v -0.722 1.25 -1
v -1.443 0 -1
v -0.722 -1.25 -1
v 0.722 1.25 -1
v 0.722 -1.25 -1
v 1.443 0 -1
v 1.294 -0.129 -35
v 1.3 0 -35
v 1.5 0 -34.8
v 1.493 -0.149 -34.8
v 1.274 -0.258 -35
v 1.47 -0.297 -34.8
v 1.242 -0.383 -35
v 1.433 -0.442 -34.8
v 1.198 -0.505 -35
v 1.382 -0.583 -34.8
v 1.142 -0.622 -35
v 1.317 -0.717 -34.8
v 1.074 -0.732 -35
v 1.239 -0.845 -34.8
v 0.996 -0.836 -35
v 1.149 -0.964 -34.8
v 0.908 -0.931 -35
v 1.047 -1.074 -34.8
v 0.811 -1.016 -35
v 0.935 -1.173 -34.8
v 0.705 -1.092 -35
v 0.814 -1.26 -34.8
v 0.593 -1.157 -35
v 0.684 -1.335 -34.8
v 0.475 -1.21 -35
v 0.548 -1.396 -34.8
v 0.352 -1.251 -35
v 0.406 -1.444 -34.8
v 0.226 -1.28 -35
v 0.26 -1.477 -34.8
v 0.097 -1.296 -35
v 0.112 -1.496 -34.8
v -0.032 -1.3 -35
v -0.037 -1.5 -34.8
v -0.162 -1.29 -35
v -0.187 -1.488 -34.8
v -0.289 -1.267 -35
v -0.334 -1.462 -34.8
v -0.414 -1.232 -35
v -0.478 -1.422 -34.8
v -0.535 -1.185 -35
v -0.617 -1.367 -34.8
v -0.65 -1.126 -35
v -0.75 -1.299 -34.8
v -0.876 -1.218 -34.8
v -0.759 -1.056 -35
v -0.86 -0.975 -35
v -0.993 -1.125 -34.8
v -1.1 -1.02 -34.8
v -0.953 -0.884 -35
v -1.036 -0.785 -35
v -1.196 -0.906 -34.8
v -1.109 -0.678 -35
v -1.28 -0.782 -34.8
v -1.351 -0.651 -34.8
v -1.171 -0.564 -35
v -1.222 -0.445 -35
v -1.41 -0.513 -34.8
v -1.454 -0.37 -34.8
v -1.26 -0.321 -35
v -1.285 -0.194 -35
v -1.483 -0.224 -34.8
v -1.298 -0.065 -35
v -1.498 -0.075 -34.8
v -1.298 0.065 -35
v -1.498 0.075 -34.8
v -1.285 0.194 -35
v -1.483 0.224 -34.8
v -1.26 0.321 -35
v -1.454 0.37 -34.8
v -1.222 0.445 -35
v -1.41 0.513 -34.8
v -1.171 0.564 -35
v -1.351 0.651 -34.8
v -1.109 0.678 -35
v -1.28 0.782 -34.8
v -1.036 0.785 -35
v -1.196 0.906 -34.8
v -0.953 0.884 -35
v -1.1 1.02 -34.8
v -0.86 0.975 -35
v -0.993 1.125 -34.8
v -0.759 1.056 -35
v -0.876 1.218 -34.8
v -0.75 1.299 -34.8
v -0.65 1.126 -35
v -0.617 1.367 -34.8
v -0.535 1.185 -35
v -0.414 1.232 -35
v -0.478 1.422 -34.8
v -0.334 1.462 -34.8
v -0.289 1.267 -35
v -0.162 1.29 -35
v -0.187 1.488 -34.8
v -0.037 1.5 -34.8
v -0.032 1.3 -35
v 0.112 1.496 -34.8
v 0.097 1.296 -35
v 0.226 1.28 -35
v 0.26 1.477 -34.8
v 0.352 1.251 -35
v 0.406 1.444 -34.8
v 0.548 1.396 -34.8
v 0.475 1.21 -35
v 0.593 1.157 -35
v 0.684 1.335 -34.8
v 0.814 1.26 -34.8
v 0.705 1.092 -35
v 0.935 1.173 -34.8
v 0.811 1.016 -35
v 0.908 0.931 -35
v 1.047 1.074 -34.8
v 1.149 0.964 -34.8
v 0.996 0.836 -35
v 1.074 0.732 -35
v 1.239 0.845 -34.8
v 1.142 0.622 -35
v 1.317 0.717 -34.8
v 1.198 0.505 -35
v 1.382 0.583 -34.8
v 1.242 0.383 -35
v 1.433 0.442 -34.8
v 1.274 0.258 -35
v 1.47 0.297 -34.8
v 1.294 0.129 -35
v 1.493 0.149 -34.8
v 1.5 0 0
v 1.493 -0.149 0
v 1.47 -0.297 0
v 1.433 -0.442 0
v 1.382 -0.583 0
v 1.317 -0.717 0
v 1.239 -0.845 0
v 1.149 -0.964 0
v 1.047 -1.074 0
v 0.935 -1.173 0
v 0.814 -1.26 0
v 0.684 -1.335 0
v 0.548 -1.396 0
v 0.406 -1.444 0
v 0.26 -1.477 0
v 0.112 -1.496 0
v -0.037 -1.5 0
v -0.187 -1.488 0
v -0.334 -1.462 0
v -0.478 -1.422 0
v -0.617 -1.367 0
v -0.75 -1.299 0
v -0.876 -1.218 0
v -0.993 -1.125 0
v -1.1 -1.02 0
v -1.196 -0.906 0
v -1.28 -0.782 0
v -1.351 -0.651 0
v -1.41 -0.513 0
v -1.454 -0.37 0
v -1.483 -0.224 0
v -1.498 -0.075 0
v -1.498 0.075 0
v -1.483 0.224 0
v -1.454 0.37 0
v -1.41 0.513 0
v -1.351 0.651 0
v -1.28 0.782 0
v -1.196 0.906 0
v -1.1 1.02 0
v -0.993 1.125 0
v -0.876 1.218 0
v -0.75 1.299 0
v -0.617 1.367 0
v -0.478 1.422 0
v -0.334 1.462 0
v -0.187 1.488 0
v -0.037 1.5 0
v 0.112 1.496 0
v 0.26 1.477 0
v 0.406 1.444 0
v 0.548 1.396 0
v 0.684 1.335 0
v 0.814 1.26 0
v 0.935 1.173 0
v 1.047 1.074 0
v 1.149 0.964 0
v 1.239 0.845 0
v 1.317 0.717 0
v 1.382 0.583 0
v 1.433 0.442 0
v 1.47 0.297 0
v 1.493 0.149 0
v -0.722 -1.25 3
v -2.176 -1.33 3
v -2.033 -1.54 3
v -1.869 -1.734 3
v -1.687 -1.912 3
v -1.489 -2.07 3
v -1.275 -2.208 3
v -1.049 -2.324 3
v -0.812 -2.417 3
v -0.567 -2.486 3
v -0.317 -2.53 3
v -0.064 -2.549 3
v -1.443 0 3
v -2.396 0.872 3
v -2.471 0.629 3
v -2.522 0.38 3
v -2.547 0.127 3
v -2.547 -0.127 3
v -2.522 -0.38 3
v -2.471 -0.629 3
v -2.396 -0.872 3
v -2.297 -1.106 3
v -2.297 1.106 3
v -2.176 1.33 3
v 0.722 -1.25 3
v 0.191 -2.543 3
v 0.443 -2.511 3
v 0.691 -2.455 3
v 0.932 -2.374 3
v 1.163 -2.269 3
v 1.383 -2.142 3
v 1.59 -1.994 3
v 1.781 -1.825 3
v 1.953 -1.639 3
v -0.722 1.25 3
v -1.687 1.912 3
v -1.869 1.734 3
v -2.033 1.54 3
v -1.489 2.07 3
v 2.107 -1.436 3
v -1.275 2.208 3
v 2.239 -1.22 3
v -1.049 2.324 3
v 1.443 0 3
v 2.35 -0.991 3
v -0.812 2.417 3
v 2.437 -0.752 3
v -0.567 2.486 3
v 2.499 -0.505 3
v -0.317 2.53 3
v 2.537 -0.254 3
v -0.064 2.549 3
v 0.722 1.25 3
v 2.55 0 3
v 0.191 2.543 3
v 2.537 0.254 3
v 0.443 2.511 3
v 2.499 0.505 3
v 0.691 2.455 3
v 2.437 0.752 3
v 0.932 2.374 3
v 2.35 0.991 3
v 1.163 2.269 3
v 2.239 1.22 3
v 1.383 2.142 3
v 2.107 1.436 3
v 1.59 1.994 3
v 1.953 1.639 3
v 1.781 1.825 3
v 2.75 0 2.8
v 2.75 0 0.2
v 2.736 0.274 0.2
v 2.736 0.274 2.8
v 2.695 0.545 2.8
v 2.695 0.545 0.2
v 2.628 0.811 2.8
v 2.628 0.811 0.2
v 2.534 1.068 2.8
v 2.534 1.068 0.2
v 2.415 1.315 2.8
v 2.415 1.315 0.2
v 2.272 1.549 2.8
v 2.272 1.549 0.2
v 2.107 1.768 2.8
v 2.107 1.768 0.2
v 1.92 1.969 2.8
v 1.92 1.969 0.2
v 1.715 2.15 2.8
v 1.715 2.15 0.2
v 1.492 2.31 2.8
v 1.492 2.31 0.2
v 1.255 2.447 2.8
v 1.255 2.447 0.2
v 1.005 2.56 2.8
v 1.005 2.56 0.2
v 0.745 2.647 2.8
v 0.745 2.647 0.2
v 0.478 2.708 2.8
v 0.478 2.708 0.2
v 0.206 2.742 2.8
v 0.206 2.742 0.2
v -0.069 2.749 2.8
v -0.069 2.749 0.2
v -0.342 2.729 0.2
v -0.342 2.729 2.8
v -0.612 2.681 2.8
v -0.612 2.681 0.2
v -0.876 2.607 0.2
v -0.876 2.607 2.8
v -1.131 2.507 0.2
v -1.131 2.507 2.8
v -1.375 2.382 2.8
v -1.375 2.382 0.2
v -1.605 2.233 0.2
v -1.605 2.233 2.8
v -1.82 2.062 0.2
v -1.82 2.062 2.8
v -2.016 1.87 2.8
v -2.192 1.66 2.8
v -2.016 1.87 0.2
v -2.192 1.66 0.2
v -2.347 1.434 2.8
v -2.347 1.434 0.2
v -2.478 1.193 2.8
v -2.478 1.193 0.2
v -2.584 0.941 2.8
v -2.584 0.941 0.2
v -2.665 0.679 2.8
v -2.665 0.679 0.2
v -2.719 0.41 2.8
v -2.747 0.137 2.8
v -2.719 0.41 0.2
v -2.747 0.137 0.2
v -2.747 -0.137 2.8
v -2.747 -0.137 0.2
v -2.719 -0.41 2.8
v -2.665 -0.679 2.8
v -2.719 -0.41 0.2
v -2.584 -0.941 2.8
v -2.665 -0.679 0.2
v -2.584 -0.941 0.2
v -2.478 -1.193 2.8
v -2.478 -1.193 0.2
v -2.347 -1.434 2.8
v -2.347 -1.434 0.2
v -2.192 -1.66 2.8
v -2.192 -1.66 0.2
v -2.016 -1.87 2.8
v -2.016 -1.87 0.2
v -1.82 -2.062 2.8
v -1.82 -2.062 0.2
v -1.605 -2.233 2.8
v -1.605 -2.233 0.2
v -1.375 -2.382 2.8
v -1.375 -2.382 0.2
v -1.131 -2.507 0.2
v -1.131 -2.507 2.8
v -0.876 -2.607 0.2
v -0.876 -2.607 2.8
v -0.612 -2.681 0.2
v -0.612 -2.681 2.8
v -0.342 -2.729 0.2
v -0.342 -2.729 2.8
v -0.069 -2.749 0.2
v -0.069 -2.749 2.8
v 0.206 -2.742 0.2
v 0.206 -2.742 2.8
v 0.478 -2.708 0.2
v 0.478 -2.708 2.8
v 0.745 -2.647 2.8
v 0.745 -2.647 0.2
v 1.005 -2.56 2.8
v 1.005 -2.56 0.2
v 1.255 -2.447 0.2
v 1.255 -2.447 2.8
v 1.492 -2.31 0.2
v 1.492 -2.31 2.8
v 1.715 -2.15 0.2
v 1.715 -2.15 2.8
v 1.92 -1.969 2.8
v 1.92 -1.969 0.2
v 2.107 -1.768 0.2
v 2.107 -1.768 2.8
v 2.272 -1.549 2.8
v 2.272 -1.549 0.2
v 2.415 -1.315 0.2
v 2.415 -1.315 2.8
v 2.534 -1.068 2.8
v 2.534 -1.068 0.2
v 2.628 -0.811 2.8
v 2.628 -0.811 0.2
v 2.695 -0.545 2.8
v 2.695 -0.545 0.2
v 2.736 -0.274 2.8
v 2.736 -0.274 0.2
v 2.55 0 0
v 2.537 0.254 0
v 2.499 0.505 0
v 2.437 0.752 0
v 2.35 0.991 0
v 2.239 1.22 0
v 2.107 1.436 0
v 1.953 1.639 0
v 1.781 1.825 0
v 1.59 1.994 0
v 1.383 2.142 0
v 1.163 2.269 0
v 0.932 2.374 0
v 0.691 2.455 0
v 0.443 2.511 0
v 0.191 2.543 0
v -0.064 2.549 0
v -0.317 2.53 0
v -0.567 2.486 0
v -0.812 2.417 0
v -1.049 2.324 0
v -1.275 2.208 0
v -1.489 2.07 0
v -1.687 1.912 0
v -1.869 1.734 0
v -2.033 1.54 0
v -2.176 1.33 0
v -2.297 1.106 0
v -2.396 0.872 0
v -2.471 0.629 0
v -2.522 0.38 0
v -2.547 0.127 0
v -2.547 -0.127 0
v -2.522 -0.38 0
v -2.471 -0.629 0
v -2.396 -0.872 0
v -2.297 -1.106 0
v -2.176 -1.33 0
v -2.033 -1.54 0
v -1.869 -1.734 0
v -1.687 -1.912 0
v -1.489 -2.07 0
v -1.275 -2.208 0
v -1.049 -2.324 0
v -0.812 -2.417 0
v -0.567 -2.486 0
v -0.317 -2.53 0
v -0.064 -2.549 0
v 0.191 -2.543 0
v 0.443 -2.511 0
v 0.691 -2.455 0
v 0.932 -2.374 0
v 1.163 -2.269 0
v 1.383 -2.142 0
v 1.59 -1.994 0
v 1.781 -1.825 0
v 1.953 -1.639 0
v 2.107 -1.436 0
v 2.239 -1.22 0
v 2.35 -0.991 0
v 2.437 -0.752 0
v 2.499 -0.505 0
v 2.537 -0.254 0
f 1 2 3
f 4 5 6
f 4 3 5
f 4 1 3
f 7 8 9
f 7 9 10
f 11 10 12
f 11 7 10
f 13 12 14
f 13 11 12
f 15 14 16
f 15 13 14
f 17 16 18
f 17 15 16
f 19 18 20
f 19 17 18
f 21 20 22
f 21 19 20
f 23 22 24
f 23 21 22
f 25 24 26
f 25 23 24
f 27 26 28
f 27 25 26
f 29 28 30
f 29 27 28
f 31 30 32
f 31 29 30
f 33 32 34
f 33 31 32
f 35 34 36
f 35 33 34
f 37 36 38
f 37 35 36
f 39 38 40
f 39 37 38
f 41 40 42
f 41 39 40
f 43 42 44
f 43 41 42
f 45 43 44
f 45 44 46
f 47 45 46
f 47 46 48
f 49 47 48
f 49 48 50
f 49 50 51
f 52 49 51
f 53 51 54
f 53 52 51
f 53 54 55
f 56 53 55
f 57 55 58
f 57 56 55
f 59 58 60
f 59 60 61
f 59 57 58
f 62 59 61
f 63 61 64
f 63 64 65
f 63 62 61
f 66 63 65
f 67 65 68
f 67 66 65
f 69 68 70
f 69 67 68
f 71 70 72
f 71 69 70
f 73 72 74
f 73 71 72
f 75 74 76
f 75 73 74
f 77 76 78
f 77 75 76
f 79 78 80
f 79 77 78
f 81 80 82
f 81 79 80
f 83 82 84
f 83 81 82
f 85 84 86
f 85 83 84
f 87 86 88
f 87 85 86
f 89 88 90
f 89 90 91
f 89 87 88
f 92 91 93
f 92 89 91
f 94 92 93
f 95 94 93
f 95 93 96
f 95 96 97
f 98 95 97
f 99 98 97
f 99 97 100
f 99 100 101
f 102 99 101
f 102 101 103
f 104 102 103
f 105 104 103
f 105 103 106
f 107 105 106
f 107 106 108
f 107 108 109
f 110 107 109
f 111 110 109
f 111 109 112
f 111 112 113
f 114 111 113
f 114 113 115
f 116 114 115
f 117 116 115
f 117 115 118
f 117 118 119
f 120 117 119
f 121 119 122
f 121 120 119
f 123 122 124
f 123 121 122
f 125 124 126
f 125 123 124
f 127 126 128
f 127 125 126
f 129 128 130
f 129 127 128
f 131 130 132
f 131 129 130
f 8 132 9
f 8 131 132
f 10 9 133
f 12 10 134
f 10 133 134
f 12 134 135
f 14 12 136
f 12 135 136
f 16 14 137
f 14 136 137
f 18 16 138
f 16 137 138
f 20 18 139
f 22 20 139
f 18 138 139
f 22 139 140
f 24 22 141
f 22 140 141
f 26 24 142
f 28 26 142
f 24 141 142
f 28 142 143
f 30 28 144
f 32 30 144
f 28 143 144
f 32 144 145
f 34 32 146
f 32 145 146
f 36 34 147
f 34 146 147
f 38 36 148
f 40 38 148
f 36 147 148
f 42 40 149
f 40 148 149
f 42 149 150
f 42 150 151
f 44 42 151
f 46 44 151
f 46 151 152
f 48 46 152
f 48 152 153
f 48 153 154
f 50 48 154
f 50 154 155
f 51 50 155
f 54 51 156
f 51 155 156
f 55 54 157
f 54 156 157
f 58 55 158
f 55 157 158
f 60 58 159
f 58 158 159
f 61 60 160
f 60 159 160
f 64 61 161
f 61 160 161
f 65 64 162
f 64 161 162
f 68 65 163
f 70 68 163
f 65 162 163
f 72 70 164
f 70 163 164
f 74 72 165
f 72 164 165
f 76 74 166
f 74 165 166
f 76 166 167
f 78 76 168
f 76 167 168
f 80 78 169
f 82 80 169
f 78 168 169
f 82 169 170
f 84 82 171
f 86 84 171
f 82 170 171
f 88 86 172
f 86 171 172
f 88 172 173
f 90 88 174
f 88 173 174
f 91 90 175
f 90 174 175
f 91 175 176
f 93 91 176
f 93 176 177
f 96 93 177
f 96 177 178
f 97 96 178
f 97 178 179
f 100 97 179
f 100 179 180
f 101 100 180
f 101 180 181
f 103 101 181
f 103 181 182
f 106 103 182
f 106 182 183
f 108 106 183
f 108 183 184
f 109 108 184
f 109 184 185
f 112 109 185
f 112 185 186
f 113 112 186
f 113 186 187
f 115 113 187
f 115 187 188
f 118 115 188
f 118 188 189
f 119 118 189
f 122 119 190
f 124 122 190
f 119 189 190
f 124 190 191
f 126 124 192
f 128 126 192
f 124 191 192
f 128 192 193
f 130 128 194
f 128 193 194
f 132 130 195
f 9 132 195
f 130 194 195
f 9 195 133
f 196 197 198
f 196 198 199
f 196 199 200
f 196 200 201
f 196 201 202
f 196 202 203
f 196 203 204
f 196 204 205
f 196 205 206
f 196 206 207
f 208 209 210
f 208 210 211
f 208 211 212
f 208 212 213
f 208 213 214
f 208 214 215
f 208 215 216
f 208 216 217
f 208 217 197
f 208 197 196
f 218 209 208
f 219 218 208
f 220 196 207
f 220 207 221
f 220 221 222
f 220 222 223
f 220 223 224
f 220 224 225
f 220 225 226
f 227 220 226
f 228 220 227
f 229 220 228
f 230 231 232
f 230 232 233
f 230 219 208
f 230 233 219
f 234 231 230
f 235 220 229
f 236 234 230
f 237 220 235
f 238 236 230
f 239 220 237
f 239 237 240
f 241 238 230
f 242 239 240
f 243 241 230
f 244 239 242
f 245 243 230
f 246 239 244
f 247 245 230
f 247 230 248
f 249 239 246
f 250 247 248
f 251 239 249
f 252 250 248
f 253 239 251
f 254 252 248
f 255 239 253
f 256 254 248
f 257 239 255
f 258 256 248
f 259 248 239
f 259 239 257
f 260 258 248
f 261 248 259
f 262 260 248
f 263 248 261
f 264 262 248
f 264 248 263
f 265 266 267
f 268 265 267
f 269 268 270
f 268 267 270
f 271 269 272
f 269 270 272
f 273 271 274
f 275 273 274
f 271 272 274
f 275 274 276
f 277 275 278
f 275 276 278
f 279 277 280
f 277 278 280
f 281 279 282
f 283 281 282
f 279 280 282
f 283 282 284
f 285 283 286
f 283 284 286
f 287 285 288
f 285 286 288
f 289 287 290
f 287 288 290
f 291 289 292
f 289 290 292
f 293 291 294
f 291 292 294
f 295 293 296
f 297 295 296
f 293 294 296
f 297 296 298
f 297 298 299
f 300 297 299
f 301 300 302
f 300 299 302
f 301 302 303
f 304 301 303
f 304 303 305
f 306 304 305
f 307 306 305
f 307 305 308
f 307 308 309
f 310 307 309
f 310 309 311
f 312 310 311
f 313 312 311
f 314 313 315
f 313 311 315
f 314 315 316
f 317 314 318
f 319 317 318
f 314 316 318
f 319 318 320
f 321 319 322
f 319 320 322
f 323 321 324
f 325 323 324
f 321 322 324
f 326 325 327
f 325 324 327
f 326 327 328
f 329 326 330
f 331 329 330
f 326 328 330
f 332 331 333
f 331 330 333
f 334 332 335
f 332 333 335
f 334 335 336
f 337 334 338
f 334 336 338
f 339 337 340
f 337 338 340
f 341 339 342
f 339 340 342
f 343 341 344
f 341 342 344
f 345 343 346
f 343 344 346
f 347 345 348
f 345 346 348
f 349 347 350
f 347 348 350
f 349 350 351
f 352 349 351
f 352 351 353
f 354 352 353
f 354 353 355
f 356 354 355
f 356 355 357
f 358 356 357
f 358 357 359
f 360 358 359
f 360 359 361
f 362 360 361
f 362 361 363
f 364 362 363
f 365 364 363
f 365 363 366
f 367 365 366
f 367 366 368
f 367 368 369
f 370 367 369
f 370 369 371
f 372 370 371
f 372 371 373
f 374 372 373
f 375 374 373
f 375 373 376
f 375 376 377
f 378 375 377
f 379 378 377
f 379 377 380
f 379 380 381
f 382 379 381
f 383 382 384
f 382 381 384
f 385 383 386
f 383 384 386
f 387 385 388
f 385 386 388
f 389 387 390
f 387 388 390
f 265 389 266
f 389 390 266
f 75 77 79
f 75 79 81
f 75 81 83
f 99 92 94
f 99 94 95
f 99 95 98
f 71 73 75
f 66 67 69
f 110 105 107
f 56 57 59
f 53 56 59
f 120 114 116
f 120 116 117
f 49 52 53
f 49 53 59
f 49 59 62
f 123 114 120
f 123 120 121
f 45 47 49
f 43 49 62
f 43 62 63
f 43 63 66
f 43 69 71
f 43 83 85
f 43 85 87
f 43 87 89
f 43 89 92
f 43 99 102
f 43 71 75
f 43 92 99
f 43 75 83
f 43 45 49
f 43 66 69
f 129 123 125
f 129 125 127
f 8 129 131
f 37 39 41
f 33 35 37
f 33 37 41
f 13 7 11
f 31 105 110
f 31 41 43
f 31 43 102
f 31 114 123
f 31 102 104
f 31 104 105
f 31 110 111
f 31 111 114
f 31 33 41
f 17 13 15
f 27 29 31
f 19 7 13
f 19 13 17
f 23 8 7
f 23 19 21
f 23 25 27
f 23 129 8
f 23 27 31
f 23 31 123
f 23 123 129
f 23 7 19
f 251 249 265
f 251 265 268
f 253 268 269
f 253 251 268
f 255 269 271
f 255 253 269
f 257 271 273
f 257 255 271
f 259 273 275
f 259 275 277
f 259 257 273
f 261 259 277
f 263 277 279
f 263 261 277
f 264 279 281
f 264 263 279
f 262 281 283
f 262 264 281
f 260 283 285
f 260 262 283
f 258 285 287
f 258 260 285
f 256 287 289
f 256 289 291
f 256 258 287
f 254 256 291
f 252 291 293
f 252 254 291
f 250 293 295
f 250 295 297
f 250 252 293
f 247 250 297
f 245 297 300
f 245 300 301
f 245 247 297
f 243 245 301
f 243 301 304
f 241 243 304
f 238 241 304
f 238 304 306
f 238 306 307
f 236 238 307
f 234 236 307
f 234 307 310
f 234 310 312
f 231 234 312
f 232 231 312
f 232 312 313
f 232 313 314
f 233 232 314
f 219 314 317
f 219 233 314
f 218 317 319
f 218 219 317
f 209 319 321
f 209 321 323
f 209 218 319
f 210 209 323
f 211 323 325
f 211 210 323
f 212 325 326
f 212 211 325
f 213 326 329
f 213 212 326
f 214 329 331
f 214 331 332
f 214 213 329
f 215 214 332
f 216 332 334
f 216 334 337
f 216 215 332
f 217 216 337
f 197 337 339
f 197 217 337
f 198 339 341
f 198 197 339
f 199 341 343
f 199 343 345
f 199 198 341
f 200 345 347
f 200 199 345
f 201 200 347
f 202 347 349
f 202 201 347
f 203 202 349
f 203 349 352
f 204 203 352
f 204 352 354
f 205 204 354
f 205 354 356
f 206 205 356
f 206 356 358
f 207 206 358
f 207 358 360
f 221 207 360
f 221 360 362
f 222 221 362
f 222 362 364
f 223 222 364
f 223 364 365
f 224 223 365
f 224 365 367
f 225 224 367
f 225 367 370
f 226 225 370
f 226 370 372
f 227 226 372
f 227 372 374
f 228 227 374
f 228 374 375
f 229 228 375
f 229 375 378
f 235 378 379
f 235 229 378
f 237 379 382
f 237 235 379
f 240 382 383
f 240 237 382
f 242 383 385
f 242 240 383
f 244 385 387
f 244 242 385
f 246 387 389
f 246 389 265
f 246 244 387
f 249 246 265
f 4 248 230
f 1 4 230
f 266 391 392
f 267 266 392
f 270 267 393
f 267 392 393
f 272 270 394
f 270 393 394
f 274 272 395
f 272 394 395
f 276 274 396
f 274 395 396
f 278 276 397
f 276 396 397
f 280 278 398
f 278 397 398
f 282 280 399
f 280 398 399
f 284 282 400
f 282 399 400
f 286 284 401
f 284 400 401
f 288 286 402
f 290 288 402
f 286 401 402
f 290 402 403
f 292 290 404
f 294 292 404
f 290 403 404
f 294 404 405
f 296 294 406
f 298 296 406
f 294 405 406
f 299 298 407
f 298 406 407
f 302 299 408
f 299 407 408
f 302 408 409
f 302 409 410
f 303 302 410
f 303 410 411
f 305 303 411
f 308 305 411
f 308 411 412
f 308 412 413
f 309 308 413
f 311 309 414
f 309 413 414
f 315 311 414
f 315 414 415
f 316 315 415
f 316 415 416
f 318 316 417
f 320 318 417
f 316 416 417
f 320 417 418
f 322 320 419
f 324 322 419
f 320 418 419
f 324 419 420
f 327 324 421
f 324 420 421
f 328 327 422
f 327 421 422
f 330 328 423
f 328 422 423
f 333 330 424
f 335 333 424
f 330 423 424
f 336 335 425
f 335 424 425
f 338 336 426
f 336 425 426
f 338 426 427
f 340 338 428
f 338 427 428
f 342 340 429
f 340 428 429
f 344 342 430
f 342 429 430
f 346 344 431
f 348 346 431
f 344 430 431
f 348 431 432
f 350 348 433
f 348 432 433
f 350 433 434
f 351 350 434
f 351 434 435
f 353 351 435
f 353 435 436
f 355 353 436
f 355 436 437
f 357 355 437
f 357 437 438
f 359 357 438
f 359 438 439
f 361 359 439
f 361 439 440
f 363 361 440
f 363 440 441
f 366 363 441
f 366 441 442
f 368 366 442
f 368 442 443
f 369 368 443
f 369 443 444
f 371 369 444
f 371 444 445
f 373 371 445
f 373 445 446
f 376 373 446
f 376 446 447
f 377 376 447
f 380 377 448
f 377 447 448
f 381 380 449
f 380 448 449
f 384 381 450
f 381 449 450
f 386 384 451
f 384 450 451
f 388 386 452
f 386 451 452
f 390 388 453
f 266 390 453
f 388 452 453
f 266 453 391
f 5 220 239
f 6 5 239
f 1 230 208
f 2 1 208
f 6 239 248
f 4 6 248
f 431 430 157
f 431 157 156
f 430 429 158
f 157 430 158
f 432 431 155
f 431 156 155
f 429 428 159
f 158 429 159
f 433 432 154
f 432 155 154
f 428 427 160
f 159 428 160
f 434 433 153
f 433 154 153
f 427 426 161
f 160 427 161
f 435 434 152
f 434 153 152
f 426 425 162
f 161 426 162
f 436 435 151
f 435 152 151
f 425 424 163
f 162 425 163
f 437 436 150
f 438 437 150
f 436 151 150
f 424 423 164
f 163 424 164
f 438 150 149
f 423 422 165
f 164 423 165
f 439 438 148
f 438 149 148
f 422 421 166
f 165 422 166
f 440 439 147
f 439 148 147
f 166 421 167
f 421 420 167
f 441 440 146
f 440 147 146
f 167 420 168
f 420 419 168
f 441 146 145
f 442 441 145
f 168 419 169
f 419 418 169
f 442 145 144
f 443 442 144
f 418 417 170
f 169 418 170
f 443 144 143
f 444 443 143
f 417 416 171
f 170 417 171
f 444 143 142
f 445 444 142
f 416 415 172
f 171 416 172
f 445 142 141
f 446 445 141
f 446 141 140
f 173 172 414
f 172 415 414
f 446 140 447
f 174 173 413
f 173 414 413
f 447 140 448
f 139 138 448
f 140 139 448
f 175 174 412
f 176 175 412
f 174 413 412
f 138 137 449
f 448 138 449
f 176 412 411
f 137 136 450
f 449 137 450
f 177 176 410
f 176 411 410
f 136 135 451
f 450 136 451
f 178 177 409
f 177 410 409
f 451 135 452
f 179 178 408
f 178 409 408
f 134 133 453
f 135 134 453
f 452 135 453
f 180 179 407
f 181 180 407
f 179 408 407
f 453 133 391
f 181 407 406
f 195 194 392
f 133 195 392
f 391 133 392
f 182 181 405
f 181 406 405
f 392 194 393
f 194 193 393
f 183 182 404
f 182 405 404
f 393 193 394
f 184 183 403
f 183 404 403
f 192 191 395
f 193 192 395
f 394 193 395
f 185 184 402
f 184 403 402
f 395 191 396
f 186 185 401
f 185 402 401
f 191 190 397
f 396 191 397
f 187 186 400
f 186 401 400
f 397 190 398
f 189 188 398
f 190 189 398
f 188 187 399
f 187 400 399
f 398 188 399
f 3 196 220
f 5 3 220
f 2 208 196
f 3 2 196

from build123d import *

# Parameters (mm, degrees)
SKETCH_R     = 2.75
PAD_DEPTH    = 3
SKETCH001_R  = 1.5
PAD001_DEPTH = 35
POCKET_DEPTH = 4
CHAMFER_SIZE = 0.2


with BuildPart() as part:
    # Sketch → Pad (new body)
    with BuildSketch(Plane.XY):
        Circle(SKETCH_R)
    extrude(amount=PAD_DEPTH)

    # Sketch001 (on Face2 of Pad) → Pad001 (join)
    with BuildSketch(Plane(origin=(0, 0, 0), x_dir=(1, 0, 0), z_dir=(0, 0, -1))):
        Circle(SKETCH001_R)
    extrude(amount=PAD001_DEPTH)

    # Sketch002 (on DatumPlane) → Pocket (cut)
    with BuildSketch(Plane.XY.offset(3)):
        Polygon((0.721688, -1.25), (1.443376, 0), (0.721688, 1.25), (-0.721688, 1.25), (-1.443376, 0), (-0.721688, -1.25), align=None)
    extrude(amount=-POCKET_DEPTH, mode=Mode.SUBTRACT)

    # Chamfer
    chamfer_edges = [part.edges().sort_by_distance(p)[0] for p in [
        (-1.5, 0, -35),
        (-2.75, 0, 0),
        (-2.75, 0, 3),
    ]]
    chamfer(chamfer_edges, length=CHAMFER_SIZE)


solid = part.part
